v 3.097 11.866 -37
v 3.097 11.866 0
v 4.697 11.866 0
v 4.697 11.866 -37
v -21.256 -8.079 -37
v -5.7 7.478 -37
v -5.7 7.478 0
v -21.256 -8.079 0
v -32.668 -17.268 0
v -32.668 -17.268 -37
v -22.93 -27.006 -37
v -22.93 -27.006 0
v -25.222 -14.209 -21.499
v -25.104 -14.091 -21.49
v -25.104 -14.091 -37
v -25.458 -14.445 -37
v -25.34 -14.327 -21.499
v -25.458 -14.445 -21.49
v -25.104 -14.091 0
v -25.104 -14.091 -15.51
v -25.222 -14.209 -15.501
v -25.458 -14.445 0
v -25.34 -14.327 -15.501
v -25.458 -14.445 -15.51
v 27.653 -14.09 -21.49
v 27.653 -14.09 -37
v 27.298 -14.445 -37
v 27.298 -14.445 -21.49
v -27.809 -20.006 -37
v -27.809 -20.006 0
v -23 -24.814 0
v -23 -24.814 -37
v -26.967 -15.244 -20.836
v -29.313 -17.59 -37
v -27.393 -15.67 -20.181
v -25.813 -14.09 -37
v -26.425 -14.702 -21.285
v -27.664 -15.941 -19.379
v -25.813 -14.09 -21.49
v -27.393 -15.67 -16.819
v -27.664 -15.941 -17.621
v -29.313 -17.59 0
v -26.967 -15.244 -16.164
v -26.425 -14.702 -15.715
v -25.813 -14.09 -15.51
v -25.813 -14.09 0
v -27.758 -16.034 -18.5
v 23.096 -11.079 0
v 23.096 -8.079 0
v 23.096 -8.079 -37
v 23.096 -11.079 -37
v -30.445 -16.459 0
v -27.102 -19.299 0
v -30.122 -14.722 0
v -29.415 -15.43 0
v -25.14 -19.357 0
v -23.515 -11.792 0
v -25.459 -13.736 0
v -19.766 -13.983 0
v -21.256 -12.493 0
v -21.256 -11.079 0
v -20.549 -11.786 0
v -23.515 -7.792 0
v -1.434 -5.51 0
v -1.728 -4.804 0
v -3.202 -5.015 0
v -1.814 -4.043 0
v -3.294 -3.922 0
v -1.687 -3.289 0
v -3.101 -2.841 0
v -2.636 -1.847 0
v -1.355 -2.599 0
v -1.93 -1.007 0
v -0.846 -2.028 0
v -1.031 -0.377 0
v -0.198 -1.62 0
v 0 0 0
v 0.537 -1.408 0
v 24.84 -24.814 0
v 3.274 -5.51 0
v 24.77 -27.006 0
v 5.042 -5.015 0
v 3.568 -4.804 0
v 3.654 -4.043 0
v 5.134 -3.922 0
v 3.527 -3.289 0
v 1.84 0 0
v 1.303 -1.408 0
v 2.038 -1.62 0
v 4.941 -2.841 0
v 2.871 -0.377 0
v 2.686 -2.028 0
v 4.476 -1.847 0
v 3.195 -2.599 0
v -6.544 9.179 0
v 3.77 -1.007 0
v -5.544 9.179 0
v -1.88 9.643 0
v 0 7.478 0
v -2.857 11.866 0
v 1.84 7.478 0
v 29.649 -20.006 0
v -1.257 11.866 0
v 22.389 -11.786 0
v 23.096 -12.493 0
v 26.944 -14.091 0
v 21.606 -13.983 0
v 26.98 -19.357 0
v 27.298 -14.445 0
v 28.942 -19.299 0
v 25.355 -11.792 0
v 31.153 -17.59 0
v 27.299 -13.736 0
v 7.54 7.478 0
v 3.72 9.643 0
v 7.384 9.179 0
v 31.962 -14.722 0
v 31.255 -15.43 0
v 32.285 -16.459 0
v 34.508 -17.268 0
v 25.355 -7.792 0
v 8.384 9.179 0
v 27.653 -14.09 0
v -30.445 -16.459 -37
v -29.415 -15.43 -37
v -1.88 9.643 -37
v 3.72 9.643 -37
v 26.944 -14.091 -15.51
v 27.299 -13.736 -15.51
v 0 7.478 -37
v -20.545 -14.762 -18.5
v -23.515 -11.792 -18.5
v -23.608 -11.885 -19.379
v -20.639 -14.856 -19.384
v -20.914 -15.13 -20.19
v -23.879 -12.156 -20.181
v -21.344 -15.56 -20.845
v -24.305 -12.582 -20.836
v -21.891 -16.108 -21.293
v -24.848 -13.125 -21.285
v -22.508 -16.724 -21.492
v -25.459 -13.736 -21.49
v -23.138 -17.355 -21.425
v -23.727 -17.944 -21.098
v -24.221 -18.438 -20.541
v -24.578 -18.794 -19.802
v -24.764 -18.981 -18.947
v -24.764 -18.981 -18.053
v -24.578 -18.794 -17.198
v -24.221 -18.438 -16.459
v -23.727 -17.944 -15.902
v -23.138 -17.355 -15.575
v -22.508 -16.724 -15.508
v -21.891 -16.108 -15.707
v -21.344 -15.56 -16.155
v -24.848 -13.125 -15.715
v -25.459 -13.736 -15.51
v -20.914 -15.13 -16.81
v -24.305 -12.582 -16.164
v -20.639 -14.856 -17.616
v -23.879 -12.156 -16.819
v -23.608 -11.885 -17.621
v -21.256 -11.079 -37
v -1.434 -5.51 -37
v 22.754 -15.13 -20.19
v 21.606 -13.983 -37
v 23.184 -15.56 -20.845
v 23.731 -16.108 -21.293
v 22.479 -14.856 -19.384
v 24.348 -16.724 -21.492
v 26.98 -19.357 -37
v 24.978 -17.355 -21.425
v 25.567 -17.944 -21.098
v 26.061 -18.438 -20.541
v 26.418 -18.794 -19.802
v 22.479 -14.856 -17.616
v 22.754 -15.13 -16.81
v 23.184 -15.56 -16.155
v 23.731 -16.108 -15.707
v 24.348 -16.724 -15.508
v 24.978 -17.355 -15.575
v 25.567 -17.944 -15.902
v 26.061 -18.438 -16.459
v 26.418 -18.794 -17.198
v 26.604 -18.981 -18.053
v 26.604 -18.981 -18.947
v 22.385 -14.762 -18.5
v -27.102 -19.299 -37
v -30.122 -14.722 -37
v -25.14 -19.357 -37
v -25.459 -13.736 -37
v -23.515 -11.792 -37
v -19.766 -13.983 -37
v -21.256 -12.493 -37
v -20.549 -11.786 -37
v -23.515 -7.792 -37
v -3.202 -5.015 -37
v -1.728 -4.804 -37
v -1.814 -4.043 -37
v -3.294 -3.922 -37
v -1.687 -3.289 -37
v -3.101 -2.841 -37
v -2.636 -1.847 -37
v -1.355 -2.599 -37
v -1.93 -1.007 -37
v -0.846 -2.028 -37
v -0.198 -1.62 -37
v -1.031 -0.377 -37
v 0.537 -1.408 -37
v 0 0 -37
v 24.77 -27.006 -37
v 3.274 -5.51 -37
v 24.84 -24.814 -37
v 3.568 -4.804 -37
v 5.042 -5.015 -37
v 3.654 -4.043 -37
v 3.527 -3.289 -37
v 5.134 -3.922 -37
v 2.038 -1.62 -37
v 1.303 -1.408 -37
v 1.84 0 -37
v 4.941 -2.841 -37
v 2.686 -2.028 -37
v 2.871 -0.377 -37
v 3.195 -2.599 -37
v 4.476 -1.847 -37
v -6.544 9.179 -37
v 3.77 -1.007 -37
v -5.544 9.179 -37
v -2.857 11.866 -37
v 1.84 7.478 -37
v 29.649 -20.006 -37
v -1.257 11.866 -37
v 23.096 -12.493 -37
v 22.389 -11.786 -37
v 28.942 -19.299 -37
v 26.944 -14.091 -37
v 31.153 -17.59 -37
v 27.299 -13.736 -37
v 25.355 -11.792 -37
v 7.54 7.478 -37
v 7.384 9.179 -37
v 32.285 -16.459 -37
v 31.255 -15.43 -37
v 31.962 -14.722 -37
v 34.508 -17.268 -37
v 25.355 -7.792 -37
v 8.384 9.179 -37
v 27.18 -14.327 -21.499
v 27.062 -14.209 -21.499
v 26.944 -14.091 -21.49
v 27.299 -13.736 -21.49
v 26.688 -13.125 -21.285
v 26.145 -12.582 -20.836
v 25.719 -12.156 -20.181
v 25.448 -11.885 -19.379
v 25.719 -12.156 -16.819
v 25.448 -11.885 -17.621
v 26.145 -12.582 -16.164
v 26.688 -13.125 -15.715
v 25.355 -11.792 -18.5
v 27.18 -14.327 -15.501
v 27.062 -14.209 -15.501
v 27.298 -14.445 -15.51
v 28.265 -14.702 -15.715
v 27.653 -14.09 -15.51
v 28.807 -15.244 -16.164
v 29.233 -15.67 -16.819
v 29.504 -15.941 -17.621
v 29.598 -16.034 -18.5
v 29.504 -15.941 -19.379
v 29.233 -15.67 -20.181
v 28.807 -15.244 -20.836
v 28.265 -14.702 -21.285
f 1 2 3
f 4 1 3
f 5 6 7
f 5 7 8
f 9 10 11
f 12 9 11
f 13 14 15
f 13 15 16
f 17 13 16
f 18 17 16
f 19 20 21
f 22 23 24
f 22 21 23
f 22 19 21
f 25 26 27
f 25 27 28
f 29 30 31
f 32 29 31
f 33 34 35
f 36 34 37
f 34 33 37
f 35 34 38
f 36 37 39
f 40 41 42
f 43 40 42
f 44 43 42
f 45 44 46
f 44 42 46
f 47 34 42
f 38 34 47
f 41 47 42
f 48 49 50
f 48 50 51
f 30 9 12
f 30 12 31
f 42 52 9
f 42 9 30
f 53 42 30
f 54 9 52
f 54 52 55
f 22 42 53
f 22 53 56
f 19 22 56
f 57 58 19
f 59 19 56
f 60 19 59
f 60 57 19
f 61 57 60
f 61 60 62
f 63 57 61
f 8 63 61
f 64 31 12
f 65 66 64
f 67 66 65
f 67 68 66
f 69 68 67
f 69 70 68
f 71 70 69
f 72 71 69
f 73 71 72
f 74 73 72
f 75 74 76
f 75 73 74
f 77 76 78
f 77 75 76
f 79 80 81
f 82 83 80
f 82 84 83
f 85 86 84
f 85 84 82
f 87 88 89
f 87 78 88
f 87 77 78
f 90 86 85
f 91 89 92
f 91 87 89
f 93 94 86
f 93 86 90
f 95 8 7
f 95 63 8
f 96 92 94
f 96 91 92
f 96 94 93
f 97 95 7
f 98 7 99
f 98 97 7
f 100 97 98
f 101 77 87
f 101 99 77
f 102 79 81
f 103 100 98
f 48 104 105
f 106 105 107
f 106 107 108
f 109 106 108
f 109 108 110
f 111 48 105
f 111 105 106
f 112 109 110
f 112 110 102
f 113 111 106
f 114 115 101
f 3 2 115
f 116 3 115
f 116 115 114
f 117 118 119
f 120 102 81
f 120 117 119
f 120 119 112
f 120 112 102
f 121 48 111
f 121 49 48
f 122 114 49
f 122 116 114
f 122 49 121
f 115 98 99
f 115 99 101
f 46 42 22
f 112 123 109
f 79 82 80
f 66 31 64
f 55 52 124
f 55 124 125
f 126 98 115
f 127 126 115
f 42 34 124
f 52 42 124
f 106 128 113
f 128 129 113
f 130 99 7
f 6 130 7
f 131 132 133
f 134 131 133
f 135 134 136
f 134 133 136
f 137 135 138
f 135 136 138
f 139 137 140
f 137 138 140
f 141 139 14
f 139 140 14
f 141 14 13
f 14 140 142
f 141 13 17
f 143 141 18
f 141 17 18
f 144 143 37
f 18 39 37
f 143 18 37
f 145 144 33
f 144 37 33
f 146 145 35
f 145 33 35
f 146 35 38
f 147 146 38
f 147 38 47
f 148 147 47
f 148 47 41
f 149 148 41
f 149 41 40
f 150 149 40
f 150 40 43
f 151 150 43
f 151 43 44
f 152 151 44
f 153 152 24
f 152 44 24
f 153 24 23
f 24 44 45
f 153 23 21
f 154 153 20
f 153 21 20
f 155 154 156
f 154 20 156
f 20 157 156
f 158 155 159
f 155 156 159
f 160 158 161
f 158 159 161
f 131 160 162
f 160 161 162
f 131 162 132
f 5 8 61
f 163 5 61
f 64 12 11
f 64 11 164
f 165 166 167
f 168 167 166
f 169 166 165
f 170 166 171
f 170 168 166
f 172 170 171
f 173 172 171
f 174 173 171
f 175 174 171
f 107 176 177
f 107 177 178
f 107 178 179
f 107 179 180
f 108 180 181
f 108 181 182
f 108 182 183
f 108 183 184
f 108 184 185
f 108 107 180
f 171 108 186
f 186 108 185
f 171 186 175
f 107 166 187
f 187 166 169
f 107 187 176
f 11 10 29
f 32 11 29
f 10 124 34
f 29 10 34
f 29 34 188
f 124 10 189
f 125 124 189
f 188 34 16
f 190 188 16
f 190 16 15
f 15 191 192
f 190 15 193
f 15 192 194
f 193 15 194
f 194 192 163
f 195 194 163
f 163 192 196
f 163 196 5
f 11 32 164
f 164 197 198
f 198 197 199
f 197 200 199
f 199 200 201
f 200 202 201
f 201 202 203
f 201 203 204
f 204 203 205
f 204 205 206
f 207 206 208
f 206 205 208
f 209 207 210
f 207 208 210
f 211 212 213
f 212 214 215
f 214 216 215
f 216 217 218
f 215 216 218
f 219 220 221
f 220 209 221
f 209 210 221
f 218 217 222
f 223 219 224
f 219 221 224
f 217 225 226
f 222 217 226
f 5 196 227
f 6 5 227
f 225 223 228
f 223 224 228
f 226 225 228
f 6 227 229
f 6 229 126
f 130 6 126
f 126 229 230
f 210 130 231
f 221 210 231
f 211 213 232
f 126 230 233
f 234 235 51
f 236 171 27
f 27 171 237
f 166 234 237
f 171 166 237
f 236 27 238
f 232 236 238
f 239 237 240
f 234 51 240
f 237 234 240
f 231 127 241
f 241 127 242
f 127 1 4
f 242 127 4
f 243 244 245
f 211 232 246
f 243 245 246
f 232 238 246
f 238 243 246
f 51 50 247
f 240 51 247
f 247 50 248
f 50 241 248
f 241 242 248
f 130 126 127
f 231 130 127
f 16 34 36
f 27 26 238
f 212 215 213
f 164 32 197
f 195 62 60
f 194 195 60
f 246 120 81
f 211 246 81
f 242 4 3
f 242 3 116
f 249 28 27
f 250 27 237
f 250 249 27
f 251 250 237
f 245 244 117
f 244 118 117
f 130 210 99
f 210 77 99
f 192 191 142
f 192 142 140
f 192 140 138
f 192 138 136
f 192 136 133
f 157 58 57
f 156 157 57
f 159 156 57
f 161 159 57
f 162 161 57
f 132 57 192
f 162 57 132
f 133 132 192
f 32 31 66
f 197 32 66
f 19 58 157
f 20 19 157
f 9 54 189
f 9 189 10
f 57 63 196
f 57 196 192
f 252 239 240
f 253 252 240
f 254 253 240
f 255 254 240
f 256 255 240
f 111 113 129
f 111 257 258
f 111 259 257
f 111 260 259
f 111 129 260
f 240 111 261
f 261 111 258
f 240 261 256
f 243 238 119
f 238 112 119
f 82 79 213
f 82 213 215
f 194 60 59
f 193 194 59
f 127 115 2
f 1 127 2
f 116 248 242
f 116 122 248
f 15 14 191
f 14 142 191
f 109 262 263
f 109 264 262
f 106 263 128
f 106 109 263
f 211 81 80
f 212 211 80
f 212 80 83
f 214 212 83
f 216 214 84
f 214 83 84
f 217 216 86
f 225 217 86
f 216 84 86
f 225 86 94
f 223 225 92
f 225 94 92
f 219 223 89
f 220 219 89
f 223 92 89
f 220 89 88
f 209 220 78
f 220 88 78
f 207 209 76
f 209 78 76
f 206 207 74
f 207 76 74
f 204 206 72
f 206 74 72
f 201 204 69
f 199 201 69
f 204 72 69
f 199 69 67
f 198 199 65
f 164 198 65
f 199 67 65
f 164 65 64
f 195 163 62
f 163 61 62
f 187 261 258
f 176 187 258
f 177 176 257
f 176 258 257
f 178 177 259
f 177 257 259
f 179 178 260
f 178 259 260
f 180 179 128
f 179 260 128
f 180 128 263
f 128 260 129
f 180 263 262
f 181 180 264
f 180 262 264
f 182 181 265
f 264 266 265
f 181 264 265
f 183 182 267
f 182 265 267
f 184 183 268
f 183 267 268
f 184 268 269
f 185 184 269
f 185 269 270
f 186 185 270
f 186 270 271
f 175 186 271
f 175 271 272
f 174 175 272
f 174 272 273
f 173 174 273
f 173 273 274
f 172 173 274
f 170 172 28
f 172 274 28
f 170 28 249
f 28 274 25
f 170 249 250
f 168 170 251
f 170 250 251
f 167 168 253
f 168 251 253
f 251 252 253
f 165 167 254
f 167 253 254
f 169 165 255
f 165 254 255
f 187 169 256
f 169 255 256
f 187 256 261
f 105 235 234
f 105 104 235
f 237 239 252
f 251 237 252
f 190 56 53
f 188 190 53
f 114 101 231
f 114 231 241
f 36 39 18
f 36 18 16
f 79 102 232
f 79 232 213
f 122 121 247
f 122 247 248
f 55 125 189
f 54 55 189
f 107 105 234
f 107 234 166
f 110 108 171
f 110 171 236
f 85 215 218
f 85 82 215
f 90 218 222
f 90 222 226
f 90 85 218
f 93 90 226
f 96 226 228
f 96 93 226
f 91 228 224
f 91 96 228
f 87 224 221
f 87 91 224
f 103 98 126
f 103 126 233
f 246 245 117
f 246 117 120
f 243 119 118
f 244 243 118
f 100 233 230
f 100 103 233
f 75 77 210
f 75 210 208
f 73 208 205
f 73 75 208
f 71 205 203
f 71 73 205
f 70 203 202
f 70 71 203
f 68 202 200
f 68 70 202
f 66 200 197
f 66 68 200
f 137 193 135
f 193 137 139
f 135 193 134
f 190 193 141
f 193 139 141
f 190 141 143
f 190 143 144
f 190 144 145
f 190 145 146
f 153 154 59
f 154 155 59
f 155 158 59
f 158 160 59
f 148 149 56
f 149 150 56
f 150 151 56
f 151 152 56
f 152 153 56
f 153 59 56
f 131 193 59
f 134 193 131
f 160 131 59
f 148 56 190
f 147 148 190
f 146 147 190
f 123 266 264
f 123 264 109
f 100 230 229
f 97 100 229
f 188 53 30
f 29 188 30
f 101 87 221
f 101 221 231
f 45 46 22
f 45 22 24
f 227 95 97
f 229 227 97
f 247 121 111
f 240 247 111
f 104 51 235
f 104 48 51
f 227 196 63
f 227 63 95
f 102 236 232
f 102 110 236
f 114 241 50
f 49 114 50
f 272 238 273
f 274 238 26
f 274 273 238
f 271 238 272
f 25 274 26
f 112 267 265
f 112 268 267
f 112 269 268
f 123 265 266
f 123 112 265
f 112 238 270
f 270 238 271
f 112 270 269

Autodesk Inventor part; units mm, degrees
ref_plane "YZ Plane" through (0, 0, 0) normal (1, 0, 0) x (0, 1, 0)
sketch "Sketch1" plane through (0, 0, 0) normal (0, 0, 1) x (1, 0, 0)
  line L0 (0, 0) -> (0, 7.4776)
  line L1 (0, 7.4776) -> (-5.7, 7.4776)
  line L2 (-5.7, 7.4776) -> (-21.2563, -8.0788)
  line L3 (-21.2563, -8.0788) -> (-21.2563, -11.0788)
  line L4 (-21.2563, -11.0788) -> (-20.5492, -11.7859)
  line L5 (-20.5492, -11.7859) -> (-21.2563, -12.493)
  line L6 (-21.2563, -12.493) -> (-19.7664, -13.983)
  line L7 (-19.7664, -13.983) -> (-25.1404, -19.357)
  line L8 (-25.1404, -19.357) -> (-27.1017, -19.2987)
  line L9 (-27.1017, -19.2987) -> (-27.8088, -20.0059)
  line L10 (-27.8088, -20.0059) -> (-23.0005, -24.8142)
  line L11 (-23.0005, -24.8142) -> (-3.2015, -5.0152)
  line L12 (-1.88, 9.6426) -> (-1.2574, 11.8658)
  line L13 (-1.2574, 11.8658) -> (-2.8574, 11.8658)
  line L14 (-2.8574, 11.8658) -> (-5.5444, 9.1788)
  line L15 (-23.5149, -7.7918) -> (-6.5444, 9.1788)
  line L16 (-6.5444, 9.1788) -> (-5.5444, 9.1788)
  line L17 (-23.5149, -7.7918) -> (-23.5149, -11.7918)
  line L18 (-29.3132, -17.5901) -> (-23.5149, -11.7918)
  line L19 (-29.3132, -17.5901) -> (-30.4446, -16.4587)
  line L20 (-30.4446, -16.4587) -> (-29.4153, -15.4295)
  line L21 (-29.4153, -15.4295) -> (-30.1224, -14.7223)
  line L22 (-30.1224, -14.7223) -> (-32.668, -17.2679)
  line L23 (-32.668, -17.2679) -> (-22.9298, -27.0062)
  line L24 (-22.9298, -27.0062) -> (-1.4337, -5.5102)
  line L25 (0.92, 16.812) -> (0.92, -19.9546) construction
  line L26 (1.84, 0) -> (1.84, 7.4776)
  line L27 (1.84, 7.4776) -> (7.54, 7.4776)
  line L28 (7.54, 7.4776) -> (23.0963, -8.0788)
  line L29 (23.0963, -8.0788) -> (23.0963, -11.0788)
  line L30 (23.0963, -11.0788) -> (22.3892, -11.7859)
  line L31 (22.3892, -11.7859) -> (23.0963, -12.493)
  line L32 (23.0963, -12.493) -> (21.6064, -13.983)
  line L33 (21.6064, -13.983) -> (26.9804, -19.357)
  line L34 (26.9804, -19.357) -> (28.9417, -19.2987)
  line L35 (28.9417, -19.2987) -> (29.6488, -20.0059)
  line L36 (29.6488, -20.0059) -> (24.8405, -24.8142)
  line L37 (24.8405, -24.8142) -> (5.0415, -5.0152)
  line L38 (3.72, 9.6426) -> (3.0974, 11.8658)
  line L39 (3.0974, 11.8658) -> (4.6974, 11.8658)
  line L40 (4.6974, 11.8658) -> (7.3844, 9.1788)
  line L41 (25.3549, -7.7918) -> (8.3844, 9.1788)
  line L42 (8.3844, 9.1788) -> (7.3844, 9.1788)
  line L43 (25.3549, -7.7918) -> (25.3549, -11.7918)
  line L44 (31.1532, -17.5901) -> (25.3549, -11.7918)
  line L45 (31.1532, -17.5901) -> (32.2846, -16.4587)
  line L46 (32.2846, -16.4587) -> (31.2553, -15.4295)
  line L47 (31.2553, -15.4295) -> (31.9624, -14.7223)
  line L48 (31.9624, -14.7223) -> (34.508, -17.2679)
  line L49 (34.508, -17.2679) -> (24.7698, -27.0062)
  line L50 (24.7698, -27.0062) -> (3.2737, -5.5102)
  line L51 (-1.88, 9.6426) -> (3.72, 9.6426)
  arc A0 (3.2737, -5.5102) -> (-1.4337, -5.5102) centre (0.92, -4.1167) ccw
  arc A1 (5.0415, -5.0152) -> (1.84, 0) centre (0.92, -4.1167) ccw
  arc A2 (0, 0) -> (-3.2015, -5.0152) centre (0.92, -4.1167) ccw
  point P0 (-22.4534, -16.67)
  dimension "d1" = 5.7
  dimension "d2" = 135
  dimension "d3" = 22
  dimension "d13" = 3
  dimension "d14" = 28
  dimension "d22" = 1.6
  dimension "d23" = 3.8
  dimension "d24" = 1
  dimension "d25" = 24
  dimension "d30" = 4
  dimension "d34" = 3.6
  dimension "d36" = 1.5
  dimension "d38" = 1.6
  dimension "d47" = 1.84
  dimension "d55" = 8.2
  dimension "d56" = 1.6
  dimension "d57" = 1
  dimension "d59" = 7.6
  dimension "d61" = 1
  dimension "d62" = 6.8
  dimension "d72" = 30.4
  dimension "d74" = 13.772
  dimension "d75" = 4.2
  dimension "d76" = 5.6
  dimension "d77" = 1.8
  dimension "d78" = 1
  dimension "d80" = 90
  dimension "d89" = 7.4776
extrude "Extrusion1" add sketch "Sketch1" against normal blind 37
ref_plane "Work Plane2" through (31.1532, -17.5901, -37) normal (0.7071, 0.7071, 0) x (-0.7071, 0.7071, 0)
sketch "Sketch3" plane through (31.1532, -17.5901, -37) normal (0.7071, 0.7071, 0) x (-0.7071, 0.7071, 0)
  circle A0 centre (5.2, 18.5) radius 3
  line L0 (0, 37) -> (8.2, 37) projected
  line L1 (8.2, 37) -> (8.2, 0) projected
  point P0 (34.4667, 37)
  dimension "d65" = 18.5
  dimension "d67" = 6
extrude "Extrusion2" cut sketch "Sketch3" against normal blind 6
thread "Thread1" size "M6x1" class "6H" standard "ANSI Metric M Profile" full length
ref_plane "Work Plane4" through (0.92, 19.6401, -37) normal (-1, 0, 0) x (0, 0, -1)
mirror "Mirror2" about plane through (0.92, 19.6401, -37) normal (-1, 0, 0) of "Extrusion2"
thread "Thread2" size "M6x1" class "6H" standard "ISO Metric profile" full length
sketch "Sketch4" plane through (31.1532, -17.5901, -37) normal (0.7071, 0.7071, 0) x (-0.7071, 0.7071, 0)
  line L0 (4.95, 0) -> (4.95, 37)
  line L1 (27.3556, 0) -> (-0.6444, 0) projected
  line L2 (0, 37) -> (8.2, 37) projected
  line L3 (5.45, 0) -> (5.45, 37)
  line L4 (8.2, 37) -> (8.2, 18.5) projected
  line L5 (5.45, 37) -> (4.95, 37)
  line L6 (5.45, 0) -> (4.95, 0)
  point P0 (34.4667, 37)
  point P1 (4.95, 0)
  dimension "d84" = 2.75
  dimension "d85" = 0.5
extrude "Extrusion3" cut sketch "Sketch4" against normal blind 0.5
mirror "Mirror3" about plane through (0.92, 19.6401, -37) normal (-1, 0, 0) of "Extrusion3"
properties part number "ESCUADRA" material "Aluminum"
